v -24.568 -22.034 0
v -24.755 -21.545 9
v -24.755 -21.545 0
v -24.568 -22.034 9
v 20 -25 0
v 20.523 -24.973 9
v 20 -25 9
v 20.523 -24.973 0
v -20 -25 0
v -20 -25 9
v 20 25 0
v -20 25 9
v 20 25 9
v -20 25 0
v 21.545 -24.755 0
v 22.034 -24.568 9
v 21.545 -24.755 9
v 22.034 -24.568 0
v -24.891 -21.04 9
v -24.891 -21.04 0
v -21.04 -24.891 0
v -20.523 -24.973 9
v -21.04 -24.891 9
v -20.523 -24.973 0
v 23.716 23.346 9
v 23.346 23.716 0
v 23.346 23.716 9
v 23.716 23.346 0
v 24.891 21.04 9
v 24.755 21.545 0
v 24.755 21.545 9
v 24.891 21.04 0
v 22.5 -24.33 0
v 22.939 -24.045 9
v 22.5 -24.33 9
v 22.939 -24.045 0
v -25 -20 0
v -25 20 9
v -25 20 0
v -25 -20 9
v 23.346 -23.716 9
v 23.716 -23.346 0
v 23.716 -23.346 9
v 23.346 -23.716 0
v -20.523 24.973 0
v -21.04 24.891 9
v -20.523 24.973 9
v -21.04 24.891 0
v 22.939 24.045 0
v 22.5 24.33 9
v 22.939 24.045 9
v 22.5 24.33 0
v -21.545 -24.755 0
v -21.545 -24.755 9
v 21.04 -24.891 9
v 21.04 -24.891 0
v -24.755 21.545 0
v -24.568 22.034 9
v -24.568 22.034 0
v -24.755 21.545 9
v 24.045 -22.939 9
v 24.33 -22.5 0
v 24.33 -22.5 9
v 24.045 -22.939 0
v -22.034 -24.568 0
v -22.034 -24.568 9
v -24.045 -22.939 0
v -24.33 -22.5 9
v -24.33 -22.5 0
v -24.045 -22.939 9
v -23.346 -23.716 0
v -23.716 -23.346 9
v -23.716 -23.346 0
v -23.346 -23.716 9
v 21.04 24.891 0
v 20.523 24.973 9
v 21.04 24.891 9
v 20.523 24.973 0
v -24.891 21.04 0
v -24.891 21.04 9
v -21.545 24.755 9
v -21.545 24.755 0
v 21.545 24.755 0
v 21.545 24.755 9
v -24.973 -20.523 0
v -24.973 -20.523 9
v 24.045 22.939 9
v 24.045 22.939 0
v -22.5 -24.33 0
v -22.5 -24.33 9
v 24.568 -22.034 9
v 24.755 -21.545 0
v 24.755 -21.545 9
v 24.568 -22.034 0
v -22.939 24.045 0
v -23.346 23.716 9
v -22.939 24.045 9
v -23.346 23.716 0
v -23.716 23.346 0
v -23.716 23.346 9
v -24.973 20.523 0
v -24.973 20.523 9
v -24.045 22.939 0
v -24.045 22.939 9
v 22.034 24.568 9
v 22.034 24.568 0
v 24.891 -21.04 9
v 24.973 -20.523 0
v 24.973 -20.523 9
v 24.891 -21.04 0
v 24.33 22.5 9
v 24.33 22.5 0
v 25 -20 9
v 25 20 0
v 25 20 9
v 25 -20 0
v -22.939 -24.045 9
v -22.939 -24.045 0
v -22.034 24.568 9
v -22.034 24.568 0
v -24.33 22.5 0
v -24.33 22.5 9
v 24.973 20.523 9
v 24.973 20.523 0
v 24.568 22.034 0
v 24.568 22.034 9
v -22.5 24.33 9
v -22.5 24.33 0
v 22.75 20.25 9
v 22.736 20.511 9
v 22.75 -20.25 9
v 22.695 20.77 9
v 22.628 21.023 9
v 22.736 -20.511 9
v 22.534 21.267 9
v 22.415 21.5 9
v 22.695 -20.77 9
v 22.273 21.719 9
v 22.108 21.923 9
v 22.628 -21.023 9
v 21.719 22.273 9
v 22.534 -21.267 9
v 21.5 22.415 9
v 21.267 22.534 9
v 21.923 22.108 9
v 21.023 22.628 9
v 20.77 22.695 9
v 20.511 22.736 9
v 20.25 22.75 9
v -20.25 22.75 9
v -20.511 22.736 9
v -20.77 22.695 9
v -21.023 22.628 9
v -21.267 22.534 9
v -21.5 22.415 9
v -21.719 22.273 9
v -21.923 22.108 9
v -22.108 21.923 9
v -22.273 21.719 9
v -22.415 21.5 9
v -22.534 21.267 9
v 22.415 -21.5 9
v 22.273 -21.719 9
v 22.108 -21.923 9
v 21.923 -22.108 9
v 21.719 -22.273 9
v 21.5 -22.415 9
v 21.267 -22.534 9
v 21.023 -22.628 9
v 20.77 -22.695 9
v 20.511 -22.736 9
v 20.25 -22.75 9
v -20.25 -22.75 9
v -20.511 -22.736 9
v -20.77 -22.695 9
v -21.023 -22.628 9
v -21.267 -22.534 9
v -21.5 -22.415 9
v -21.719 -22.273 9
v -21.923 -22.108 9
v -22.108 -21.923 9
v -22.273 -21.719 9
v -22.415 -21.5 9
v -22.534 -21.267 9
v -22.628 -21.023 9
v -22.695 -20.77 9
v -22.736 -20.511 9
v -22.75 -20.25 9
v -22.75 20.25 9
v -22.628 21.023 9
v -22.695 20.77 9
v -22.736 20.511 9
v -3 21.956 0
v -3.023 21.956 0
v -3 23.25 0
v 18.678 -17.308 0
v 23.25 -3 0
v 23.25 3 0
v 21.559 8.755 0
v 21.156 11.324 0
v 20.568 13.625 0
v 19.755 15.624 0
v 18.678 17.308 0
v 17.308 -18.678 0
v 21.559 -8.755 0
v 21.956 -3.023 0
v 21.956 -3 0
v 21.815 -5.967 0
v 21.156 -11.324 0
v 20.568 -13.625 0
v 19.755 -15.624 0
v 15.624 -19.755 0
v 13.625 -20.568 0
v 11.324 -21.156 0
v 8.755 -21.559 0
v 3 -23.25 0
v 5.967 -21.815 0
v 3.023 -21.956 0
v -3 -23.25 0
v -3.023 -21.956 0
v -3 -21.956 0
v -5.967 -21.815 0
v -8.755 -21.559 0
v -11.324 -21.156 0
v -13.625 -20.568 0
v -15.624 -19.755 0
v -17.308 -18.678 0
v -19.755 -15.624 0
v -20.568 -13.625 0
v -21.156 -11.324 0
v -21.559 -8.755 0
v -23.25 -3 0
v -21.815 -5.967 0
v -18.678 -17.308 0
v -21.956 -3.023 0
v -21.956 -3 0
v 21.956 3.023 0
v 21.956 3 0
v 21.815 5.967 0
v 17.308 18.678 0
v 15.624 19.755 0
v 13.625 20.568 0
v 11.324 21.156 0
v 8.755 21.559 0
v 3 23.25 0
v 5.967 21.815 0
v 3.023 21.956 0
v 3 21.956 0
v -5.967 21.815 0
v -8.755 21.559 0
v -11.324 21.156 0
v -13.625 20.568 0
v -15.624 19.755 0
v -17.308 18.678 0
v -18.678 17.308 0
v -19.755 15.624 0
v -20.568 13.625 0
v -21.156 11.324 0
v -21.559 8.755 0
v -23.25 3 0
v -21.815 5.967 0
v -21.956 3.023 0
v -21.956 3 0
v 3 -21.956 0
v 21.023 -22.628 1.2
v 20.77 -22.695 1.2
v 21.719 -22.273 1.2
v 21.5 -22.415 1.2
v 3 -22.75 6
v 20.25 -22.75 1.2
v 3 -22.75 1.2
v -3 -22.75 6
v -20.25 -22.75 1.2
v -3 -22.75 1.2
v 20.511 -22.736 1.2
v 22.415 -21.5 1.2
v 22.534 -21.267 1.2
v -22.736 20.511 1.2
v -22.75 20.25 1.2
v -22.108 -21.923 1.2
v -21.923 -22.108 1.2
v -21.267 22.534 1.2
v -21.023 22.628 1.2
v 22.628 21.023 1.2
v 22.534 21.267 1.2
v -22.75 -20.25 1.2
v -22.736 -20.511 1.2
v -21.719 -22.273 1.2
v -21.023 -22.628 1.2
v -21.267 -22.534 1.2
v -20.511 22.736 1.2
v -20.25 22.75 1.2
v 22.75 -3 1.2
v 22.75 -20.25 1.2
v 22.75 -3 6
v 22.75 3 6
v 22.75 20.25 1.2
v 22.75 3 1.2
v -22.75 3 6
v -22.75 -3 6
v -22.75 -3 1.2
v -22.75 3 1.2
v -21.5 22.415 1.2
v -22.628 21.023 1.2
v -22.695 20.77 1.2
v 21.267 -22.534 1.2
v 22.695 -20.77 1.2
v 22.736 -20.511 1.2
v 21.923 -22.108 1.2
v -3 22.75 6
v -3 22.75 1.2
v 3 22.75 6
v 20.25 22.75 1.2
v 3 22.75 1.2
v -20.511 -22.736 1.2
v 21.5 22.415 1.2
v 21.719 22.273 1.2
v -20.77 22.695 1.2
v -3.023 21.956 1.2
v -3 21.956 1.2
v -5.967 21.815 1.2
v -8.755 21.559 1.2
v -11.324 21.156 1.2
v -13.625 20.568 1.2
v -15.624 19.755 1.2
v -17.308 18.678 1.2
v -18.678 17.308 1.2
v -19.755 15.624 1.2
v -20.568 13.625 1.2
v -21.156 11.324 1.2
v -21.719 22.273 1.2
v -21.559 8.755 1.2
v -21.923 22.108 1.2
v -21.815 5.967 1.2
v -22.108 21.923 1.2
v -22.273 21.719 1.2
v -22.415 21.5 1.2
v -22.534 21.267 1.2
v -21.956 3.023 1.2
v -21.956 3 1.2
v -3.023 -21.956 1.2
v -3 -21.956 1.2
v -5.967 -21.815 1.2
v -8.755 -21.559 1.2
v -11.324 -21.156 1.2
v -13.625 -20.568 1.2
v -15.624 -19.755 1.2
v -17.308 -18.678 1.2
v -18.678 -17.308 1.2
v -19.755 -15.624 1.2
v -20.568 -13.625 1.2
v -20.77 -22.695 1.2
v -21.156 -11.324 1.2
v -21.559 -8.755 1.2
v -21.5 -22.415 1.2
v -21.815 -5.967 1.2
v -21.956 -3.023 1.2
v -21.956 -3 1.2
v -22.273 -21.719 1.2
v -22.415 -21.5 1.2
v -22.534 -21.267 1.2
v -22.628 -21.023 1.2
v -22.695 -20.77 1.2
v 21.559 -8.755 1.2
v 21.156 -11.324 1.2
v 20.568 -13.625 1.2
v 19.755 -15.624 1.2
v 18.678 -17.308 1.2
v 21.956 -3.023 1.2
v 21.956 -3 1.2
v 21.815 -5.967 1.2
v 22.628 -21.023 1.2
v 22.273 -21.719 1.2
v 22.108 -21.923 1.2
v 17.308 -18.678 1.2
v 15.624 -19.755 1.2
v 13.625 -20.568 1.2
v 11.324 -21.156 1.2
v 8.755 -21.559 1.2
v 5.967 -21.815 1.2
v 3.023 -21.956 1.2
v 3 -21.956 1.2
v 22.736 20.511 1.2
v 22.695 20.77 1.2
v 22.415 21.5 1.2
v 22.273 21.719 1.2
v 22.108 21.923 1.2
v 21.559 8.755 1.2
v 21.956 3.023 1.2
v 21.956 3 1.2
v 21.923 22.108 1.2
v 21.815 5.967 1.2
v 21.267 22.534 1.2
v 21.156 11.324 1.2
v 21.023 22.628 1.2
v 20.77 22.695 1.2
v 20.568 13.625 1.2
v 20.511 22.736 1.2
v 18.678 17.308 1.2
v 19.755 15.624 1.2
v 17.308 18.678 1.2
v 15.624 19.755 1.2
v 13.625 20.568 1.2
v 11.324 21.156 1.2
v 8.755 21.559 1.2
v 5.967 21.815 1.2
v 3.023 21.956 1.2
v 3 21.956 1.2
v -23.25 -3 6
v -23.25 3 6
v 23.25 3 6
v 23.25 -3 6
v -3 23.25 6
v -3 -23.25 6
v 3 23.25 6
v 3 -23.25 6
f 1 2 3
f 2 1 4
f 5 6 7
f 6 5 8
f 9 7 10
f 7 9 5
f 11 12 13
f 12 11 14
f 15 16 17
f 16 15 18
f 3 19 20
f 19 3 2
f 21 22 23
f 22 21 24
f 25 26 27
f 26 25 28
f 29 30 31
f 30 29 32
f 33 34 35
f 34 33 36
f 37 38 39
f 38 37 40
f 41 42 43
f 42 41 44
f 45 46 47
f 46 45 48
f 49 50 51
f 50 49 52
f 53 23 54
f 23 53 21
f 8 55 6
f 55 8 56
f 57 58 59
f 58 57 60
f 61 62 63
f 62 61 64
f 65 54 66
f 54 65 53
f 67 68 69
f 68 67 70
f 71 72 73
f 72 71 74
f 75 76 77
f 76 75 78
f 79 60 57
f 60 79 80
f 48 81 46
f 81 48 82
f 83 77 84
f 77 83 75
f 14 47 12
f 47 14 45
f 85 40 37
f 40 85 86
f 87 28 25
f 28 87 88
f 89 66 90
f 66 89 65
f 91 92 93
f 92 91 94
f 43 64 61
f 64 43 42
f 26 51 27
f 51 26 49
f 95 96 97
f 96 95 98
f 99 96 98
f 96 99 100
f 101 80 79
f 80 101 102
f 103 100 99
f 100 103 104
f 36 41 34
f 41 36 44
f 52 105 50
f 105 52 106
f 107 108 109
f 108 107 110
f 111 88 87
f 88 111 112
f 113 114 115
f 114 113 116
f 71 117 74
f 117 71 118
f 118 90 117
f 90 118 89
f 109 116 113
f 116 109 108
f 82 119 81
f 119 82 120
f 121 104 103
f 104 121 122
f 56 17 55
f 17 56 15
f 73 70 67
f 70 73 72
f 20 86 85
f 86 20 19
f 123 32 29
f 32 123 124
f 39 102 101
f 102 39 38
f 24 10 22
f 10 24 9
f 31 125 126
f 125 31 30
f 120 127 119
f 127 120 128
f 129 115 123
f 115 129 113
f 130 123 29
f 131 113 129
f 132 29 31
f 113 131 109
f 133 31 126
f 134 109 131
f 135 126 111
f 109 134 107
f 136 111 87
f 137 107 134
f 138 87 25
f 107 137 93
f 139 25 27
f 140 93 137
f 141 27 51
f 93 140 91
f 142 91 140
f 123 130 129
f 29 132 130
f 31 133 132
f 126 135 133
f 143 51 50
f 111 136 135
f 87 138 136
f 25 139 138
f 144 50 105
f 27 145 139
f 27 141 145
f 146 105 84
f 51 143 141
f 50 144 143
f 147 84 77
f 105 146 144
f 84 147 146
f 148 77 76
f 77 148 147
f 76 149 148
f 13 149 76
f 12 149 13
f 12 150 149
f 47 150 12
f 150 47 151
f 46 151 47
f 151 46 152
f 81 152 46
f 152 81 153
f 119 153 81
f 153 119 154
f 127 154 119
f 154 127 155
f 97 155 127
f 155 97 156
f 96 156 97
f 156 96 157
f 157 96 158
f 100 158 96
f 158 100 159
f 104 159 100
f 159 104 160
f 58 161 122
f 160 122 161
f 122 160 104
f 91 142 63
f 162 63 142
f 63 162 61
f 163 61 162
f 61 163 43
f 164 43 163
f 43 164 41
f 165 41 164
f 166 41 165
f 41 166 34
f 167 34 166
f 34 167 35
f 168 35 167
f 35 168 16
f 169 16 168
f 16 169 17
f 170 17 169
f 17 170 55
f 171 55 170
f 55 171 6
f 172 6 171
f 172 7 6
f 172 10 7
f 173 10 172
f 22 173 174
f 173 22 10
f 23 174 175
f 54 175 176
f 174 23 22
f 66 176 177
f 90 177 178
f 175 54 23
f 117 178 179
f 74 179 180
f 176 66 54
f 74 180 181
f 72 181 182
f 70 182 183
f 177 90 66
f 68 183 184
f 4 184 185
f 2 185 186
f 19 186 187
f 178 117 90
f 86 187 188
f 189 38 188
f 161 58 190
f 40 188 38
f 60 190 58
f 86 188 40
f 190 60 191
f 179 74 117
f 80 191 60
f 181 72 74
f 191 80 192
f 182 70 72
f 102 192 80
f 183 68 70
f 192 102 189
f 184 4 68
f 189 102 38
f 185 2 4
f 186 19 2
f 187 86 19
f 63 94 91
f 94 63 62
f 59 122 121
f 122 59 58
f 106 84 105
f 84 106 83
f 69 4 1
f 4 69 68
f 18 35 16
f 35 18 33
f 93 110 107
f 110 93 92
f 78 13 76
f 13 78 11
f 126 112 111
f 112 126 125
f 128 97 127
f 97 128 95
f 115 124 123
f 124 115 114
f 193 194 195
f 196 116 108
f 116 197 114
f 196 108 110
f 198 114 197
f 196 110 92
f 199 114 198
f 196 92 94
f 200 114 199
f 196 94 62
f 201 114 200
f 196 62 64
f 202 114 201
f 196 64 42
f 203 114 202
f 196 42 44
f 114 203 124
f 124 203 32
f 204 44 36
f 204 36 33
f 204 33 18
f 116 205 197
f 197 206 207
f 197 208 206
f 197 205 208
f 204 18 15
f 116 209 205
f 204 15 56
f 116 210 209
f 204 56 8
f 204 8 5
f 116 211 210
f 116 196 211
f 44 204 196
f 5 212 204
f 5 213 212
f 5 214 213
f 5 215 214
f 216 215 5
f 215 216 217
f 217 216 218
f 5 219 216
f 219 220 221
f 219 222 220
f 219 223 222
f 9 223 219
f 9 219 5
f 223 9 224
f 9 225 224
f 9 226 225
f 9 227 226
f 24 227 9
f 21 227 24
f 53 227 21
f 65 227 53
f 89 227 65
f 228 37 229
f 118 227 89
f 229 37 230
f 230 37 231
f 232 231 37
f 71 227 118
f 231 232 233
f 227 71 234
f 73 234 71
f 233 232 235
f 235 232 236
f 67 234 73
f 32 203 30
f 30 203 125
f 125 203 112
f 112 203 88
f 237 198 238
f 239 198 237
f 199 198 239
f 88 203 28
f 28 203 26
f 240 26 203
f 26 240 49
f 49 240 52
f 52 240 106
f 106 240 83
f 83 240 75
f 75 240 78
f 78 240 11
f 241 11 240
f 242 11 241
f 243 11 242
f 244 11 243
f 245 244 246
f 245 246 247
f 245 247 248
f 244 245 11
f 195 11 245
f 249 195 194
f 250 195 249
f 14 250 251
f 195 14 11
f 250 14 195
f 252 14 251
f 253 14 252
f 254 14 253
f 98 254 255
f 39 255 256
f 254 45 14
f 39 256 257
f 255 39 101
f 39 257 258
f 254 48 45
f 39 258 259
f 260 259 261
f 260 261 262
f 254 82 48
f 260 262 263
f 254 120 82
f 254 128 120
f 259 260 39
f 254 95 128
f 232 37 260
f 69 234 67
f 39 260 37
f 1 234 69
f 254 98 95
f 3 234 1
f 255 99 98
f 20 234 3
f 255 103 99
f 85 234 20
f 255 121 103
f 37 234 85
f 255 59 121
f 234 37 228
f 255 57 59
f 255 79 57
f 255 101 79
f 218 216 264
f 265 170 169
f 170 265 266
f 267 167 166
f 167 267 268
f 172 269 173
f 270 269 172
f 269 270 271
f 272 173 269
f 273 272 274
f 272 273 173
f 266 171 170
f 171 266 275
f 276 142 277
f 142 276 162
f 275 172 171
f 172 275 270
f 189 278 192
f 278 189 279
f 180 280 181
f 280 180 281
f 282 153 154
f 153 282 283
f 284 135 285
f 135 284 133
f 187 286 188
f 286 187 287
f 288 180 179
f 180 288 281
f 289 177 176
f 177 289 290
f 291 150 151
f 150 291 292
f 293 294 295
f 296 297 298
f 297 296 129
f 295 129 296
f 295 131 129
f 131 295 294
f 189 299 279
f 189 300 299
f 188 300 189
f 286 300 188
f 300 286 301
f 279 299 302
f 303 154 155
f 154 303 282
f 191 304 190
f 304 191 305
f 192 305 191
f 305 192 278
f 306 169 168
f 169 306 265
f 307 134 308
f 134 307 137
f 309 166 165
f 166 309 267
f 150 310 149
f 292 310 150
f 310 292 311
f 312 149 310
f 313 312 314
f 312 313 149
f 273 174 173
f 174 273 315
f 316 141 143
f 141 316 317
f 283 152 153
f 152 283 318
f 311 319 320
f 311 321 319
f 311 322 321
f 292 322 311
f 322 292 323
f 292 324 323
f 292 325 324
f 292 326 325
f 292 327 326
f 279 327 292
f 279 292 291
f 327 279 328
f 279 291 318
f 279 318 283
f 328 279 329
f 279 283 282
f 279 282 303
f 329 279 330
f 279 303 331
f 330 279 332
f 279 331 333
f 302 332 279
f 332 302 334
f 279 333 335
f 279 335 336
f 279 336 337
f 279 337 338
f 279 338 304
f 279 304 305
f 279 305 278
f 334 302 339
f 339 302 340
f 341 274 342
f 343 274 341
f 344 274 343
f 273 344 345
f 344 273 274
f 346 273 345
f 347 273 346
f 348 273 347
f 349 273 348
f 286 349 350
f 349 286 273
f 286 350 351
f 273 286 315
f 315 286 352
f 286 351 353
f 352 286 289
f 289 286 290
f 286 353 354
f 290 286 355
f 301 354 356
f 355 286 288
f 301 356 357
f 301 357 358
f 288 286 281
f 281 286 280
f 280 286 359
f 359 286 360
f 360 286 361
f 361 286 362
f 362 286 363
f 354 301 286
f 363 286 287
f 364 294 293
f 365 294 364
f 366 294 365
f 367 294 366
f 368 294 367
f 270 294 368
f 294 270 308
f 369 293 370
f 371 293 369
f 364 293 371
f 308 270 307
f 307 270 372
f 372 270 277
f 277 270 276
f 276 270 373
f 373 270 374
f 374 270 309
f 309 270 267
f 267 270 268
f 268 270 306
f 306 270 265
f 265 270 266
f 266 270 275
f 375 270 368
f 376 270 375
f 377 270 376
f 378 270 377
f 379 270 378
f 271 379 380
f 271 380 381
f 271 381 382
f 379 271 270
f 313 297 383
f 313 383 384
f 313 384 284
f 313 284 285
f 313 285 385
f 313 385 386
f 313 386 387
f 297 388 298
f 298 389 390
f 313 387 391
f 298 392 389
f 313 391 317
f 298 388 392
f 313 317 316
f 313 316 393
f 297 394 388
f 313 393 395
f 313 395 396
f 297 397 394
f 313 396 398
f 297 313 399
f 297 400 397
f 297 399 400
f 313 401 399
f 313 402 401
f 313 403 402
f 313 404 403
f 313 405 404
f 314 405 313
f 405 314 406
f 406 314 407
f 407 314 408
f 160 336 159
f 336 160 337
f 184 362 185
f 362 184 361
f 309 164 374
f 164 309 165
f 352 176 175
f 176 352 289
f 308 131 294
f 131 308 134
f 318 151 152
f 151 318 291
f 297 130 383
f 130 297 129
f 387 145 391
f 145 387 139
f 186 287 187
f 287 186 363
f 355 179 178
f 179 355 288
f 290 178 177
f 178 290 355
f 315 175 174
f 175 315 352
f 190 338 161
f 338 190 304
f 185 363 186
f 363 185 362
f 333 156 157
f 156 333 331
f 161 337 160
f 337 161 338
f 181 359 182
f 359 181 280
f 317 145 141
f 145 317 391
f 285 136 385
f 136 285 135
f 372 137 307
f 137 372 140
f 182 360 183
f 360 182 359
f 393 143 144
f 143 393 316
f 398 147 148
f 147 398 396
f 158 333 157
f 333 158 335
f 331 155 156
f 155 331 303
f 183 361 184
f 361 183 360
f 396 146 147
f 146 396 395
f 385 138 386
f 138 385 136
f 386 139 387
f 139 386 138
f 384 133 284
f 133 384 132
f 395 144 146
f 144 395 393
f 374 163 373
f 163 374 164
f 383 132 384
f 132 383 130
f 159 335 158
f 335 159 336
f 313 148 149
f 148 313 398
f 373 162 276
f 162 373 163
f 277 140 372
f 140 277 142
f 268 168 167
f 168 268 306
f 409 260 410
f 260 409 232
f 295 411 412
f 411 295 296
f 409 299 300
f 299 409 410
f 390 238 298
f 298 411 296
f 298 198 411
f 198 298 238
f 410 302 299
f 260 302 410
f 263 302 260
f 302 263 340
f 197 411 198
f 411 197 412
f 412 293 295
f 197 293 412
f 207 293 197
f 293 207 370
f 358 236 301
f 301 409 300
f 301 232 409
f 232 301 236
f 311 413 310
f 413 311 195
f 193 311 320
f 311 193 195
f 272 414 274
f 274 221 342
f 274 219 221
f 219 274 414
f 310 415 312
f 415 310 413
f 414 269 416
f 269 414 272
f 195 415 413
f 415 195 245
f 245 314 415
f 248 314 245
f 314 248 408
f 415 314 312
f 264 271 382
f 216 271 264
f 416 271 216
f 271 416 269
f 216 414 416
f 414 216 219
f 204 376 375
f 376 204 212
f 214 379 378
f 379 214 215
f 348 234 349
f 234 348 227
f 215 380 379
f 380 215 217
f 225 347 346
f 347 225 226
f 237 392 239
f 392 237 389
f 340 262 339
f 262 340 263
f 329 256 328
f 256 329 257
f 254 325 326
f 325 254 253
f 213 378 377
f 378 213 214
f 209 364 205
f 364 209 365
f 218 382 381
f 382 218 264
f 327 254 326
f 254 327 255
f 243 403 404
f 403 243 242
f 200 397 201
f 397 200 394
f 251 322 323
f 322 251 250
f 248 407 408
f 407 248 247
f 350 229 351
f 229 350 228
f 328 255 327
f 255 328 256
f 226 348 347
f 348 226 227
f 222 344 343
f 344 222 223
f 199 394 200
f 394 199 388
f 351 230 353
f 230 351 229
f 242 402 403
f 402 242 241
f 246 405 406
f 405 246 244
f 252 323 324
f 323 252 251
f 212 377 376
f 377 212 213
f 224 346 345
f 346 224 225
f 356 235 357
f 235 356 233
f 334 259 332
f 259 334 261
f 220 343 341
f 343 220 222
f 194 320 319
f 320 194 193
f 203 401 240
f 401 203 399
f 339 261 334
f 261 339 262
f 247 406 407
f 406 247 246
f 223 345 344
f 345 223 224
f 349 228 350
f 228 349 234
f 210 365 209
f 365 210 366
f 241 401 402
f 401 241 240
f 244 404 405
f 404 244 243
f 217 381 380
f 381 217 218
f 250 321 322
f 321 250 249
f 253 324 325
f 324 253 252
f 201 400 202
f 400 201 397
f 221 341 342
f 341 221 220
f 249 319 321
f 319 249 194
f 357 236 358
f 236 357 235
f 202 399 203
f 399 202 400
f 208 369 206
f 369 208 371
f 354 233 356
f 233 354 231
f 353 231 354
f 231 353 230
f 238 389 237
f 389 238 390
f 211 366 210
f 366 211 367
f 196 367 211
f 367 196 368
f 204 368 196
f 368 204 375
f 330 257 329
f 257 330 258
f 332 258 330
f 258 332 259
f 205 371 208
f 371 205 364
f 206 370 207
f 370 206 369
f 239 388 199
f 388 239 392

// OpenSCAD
// file: lk-fuga-settings.scad
// LK FUGA INSIDE FRAME
squashed_circle_max_radius = 51/2;
squashed_circle_min_radius = 44/2;
squashed_circle_delta_radius = squashed_circle_max_radius - squashed_circle_min_radius;



function squashed_circle_max_radius($fn) = [for(a=[0:360/($fn?$fn:20):360]) [
    (squashed_circle_max_radius+(sin((a-45)*2)*squashed_circle_delta_radius))*cos(a),   // x
    (squashed_circle_max_radius+(cos(a*2)*squashed_circle_delta_radius))*sin(a)         // y
]];





// LK FUGA BASELINE FRAME




// LK FUGA IHC LOW VOLTAGE TANGENT
new_ihc_tangent_length = 44;
new_ihc_tangent_width = 17;
new_ihc_tangent_curvature_radius = 30;
new_ihc_tangent_corner_fillet_radius = 2;
new_ihc_tanget_button_tap_width = 0.6;
new_ihc_tanget_button_tap_length = 3;
new_ihc_tanget_button_tap_height = 1.9;


new_ihc_tanget_locktap_width = 3.65;
new_ihc_tanget_locktap_thickness = 0.85;
new_ihc_tanget_locktap_head_thickness = 1.7;
new_ihc_tanget_locktap_head_height = 1;
new_ihc_tanget_locktap_c2c_dist = 10.5;
new_ihc_tanget_end_opening_width = 5;
new_ihc_tanget_end_opening_height=1;

new_ihc_tanget_wall_thickness = 1;
// main file
// Import libaries


// Include settings
include <lk-fuga-settings.scad>;



baseline5050($fn=60);

module smooth(r) offset(r=r) offset(r=-r) children();


module baseline5050() difference() {
    linear_extrude(9) smooth(5) square([50,50], true);
    translate([0,0,1.2]) linear_extrude(9) smooth(2.5) square([45.5,45.5], true);
    linear_extrude(6) square([46.5,6], true);
    linear_extrude(6) square([6,46.5], true);
    linear_extrude(9) polygon(squashed_circle_max_radius($fn=60));
}


module front_profile() smooth(2) square([45,45], true);


module front_profile_taps() {
    front_profile();
    square([46.5,6], true);
}


module back_profile()  {
    large_radius=50.5/2;
    small_radius=43/2;
    radius_delta=large_radius-small_radius;
    difference() {
        polygon([
            for(a=[0:5:360]) [
                (large_radius+(sin((a-45)*2)*radius_delta))*cos(a), 
                (large_radius+(cos(a*2)*radius_delta))*sin(a)
            ]
        ]);
    }
}


module tanget_tap_profile(l=2.8) polygon([[0,0],[0,1],[1,2],[1,1],[l,1],[l,0]]);

module ihc_tangent_profile() {
    inner_curvature_radius = 30;
    outer_tanget_width = 17;
    tangent_height = 3.6;

    intersection() {
        translate([0,-inner_curvature_radius+tangent_height]) circle(r=inner_curvature_radius);
        translate([-outer_tanget_width/2,0]) square([outer_tanget_width, tangent_height]);
    }
}


module new_ihc_tanget() {
    tangent_length=44;
    tap_length=2.8;
    wall_thickness = 1;
    outer_tanget_width = 17;

    // Body
    difference() {
        translate([0,tangent_length/2]) rotate([90,0,0]) linear_extrude(tangent_length) ihc_tangent_profile();
        translate([0,tangent_length/2-wall_thickness]) rotate([90,0,0]) linear_extrude(tangent_length-2*wall_thickness) offset(delta=-wall_thickness) ihc_tangent_profile();
        linear_extrude(1) square([15,tangent_length-2*wall_thickness], true);
        linear_extrude(1) square([5,tangent_length], true);
        
        // Fillets
        linear_extrude(10) difference() {
            square([outer_tanget_width,tangent_length], true);
            smooth(r=2) square([outer_tanget_width,tangent_length], true);
        }
    }
    
    // Button stands (crosses)
    translate([0,0,1]) for (i=[1,-1]) translate([0, 27/2*i]) linear_extrude(2) {
        square([0.5, 3], true);
        square([3, 0.5], true);
    }
    
    // Taps
    translate([2.8/2+10.5/2,-tangent_length/2,-tap_length]) rotate([0,-90,0]) linear_extrude(2.8) tanget_tap_profile(tap_length);
    translate([2.8/2-10.5/2,-tangent_length/2,-tap_length]) rotate([0,-90,0]) linear_extrude(2.8) tanget_tap_profile(tap_length);
    translate([-2.8/2+10.5/2,tangent_length/2,-tap_length]) rotate([0,-90,180]) linear_extrude(2.8) tanget_tap_profile(tap_length);
    translate([-2.8/2-10.5/2,tangent_length/2,-tap_length]) rotate([0,-90,180]) linear_extrude(2.8) tanget_tap_profile(tap_length);
}



module slim_cover_bar() {
    
    tangent_length=44;
    tap_length=2.8;
    wall_thickness=1.4;
    
    // Body
    difference() {
        linear_extrude(3.2) square([10,tangent_length], true);
        linear_extrude(3.2-wall_thickness) square([10-2*wall_thickness,tangent_length-2*wall_thickness], true);
        linear_extrude(wall_thickness) square([5,tangent_length], true);
    }

    // Taps
    translate([10/2-wall_thickness, -tangent_length/2+2,-tap_length]) rotate([0,-90,180]) linear_extrude(wall_thickness) tanget_tap_profile(tap_length);
    translate([-10/2, -tangent_length/2+2,-tap_length]) rotate([0,-90,180]) linear_extrude(wall_thickness) tanget_tap_profile(tap_length);
    translate([-10/2+wall_thickness,  tangent_length/2-2,-tap_length]) rotate([0,-90,0]) linear_extrude(wall_thickness) tanget_tap_profile(tap_length);
    translate([10/2,  tangent_length/2-2,-tap_length]) rotate([0,-90,0]) linear_extrude(wall_thickness) tanget_tap_profile(tap_length);
}
